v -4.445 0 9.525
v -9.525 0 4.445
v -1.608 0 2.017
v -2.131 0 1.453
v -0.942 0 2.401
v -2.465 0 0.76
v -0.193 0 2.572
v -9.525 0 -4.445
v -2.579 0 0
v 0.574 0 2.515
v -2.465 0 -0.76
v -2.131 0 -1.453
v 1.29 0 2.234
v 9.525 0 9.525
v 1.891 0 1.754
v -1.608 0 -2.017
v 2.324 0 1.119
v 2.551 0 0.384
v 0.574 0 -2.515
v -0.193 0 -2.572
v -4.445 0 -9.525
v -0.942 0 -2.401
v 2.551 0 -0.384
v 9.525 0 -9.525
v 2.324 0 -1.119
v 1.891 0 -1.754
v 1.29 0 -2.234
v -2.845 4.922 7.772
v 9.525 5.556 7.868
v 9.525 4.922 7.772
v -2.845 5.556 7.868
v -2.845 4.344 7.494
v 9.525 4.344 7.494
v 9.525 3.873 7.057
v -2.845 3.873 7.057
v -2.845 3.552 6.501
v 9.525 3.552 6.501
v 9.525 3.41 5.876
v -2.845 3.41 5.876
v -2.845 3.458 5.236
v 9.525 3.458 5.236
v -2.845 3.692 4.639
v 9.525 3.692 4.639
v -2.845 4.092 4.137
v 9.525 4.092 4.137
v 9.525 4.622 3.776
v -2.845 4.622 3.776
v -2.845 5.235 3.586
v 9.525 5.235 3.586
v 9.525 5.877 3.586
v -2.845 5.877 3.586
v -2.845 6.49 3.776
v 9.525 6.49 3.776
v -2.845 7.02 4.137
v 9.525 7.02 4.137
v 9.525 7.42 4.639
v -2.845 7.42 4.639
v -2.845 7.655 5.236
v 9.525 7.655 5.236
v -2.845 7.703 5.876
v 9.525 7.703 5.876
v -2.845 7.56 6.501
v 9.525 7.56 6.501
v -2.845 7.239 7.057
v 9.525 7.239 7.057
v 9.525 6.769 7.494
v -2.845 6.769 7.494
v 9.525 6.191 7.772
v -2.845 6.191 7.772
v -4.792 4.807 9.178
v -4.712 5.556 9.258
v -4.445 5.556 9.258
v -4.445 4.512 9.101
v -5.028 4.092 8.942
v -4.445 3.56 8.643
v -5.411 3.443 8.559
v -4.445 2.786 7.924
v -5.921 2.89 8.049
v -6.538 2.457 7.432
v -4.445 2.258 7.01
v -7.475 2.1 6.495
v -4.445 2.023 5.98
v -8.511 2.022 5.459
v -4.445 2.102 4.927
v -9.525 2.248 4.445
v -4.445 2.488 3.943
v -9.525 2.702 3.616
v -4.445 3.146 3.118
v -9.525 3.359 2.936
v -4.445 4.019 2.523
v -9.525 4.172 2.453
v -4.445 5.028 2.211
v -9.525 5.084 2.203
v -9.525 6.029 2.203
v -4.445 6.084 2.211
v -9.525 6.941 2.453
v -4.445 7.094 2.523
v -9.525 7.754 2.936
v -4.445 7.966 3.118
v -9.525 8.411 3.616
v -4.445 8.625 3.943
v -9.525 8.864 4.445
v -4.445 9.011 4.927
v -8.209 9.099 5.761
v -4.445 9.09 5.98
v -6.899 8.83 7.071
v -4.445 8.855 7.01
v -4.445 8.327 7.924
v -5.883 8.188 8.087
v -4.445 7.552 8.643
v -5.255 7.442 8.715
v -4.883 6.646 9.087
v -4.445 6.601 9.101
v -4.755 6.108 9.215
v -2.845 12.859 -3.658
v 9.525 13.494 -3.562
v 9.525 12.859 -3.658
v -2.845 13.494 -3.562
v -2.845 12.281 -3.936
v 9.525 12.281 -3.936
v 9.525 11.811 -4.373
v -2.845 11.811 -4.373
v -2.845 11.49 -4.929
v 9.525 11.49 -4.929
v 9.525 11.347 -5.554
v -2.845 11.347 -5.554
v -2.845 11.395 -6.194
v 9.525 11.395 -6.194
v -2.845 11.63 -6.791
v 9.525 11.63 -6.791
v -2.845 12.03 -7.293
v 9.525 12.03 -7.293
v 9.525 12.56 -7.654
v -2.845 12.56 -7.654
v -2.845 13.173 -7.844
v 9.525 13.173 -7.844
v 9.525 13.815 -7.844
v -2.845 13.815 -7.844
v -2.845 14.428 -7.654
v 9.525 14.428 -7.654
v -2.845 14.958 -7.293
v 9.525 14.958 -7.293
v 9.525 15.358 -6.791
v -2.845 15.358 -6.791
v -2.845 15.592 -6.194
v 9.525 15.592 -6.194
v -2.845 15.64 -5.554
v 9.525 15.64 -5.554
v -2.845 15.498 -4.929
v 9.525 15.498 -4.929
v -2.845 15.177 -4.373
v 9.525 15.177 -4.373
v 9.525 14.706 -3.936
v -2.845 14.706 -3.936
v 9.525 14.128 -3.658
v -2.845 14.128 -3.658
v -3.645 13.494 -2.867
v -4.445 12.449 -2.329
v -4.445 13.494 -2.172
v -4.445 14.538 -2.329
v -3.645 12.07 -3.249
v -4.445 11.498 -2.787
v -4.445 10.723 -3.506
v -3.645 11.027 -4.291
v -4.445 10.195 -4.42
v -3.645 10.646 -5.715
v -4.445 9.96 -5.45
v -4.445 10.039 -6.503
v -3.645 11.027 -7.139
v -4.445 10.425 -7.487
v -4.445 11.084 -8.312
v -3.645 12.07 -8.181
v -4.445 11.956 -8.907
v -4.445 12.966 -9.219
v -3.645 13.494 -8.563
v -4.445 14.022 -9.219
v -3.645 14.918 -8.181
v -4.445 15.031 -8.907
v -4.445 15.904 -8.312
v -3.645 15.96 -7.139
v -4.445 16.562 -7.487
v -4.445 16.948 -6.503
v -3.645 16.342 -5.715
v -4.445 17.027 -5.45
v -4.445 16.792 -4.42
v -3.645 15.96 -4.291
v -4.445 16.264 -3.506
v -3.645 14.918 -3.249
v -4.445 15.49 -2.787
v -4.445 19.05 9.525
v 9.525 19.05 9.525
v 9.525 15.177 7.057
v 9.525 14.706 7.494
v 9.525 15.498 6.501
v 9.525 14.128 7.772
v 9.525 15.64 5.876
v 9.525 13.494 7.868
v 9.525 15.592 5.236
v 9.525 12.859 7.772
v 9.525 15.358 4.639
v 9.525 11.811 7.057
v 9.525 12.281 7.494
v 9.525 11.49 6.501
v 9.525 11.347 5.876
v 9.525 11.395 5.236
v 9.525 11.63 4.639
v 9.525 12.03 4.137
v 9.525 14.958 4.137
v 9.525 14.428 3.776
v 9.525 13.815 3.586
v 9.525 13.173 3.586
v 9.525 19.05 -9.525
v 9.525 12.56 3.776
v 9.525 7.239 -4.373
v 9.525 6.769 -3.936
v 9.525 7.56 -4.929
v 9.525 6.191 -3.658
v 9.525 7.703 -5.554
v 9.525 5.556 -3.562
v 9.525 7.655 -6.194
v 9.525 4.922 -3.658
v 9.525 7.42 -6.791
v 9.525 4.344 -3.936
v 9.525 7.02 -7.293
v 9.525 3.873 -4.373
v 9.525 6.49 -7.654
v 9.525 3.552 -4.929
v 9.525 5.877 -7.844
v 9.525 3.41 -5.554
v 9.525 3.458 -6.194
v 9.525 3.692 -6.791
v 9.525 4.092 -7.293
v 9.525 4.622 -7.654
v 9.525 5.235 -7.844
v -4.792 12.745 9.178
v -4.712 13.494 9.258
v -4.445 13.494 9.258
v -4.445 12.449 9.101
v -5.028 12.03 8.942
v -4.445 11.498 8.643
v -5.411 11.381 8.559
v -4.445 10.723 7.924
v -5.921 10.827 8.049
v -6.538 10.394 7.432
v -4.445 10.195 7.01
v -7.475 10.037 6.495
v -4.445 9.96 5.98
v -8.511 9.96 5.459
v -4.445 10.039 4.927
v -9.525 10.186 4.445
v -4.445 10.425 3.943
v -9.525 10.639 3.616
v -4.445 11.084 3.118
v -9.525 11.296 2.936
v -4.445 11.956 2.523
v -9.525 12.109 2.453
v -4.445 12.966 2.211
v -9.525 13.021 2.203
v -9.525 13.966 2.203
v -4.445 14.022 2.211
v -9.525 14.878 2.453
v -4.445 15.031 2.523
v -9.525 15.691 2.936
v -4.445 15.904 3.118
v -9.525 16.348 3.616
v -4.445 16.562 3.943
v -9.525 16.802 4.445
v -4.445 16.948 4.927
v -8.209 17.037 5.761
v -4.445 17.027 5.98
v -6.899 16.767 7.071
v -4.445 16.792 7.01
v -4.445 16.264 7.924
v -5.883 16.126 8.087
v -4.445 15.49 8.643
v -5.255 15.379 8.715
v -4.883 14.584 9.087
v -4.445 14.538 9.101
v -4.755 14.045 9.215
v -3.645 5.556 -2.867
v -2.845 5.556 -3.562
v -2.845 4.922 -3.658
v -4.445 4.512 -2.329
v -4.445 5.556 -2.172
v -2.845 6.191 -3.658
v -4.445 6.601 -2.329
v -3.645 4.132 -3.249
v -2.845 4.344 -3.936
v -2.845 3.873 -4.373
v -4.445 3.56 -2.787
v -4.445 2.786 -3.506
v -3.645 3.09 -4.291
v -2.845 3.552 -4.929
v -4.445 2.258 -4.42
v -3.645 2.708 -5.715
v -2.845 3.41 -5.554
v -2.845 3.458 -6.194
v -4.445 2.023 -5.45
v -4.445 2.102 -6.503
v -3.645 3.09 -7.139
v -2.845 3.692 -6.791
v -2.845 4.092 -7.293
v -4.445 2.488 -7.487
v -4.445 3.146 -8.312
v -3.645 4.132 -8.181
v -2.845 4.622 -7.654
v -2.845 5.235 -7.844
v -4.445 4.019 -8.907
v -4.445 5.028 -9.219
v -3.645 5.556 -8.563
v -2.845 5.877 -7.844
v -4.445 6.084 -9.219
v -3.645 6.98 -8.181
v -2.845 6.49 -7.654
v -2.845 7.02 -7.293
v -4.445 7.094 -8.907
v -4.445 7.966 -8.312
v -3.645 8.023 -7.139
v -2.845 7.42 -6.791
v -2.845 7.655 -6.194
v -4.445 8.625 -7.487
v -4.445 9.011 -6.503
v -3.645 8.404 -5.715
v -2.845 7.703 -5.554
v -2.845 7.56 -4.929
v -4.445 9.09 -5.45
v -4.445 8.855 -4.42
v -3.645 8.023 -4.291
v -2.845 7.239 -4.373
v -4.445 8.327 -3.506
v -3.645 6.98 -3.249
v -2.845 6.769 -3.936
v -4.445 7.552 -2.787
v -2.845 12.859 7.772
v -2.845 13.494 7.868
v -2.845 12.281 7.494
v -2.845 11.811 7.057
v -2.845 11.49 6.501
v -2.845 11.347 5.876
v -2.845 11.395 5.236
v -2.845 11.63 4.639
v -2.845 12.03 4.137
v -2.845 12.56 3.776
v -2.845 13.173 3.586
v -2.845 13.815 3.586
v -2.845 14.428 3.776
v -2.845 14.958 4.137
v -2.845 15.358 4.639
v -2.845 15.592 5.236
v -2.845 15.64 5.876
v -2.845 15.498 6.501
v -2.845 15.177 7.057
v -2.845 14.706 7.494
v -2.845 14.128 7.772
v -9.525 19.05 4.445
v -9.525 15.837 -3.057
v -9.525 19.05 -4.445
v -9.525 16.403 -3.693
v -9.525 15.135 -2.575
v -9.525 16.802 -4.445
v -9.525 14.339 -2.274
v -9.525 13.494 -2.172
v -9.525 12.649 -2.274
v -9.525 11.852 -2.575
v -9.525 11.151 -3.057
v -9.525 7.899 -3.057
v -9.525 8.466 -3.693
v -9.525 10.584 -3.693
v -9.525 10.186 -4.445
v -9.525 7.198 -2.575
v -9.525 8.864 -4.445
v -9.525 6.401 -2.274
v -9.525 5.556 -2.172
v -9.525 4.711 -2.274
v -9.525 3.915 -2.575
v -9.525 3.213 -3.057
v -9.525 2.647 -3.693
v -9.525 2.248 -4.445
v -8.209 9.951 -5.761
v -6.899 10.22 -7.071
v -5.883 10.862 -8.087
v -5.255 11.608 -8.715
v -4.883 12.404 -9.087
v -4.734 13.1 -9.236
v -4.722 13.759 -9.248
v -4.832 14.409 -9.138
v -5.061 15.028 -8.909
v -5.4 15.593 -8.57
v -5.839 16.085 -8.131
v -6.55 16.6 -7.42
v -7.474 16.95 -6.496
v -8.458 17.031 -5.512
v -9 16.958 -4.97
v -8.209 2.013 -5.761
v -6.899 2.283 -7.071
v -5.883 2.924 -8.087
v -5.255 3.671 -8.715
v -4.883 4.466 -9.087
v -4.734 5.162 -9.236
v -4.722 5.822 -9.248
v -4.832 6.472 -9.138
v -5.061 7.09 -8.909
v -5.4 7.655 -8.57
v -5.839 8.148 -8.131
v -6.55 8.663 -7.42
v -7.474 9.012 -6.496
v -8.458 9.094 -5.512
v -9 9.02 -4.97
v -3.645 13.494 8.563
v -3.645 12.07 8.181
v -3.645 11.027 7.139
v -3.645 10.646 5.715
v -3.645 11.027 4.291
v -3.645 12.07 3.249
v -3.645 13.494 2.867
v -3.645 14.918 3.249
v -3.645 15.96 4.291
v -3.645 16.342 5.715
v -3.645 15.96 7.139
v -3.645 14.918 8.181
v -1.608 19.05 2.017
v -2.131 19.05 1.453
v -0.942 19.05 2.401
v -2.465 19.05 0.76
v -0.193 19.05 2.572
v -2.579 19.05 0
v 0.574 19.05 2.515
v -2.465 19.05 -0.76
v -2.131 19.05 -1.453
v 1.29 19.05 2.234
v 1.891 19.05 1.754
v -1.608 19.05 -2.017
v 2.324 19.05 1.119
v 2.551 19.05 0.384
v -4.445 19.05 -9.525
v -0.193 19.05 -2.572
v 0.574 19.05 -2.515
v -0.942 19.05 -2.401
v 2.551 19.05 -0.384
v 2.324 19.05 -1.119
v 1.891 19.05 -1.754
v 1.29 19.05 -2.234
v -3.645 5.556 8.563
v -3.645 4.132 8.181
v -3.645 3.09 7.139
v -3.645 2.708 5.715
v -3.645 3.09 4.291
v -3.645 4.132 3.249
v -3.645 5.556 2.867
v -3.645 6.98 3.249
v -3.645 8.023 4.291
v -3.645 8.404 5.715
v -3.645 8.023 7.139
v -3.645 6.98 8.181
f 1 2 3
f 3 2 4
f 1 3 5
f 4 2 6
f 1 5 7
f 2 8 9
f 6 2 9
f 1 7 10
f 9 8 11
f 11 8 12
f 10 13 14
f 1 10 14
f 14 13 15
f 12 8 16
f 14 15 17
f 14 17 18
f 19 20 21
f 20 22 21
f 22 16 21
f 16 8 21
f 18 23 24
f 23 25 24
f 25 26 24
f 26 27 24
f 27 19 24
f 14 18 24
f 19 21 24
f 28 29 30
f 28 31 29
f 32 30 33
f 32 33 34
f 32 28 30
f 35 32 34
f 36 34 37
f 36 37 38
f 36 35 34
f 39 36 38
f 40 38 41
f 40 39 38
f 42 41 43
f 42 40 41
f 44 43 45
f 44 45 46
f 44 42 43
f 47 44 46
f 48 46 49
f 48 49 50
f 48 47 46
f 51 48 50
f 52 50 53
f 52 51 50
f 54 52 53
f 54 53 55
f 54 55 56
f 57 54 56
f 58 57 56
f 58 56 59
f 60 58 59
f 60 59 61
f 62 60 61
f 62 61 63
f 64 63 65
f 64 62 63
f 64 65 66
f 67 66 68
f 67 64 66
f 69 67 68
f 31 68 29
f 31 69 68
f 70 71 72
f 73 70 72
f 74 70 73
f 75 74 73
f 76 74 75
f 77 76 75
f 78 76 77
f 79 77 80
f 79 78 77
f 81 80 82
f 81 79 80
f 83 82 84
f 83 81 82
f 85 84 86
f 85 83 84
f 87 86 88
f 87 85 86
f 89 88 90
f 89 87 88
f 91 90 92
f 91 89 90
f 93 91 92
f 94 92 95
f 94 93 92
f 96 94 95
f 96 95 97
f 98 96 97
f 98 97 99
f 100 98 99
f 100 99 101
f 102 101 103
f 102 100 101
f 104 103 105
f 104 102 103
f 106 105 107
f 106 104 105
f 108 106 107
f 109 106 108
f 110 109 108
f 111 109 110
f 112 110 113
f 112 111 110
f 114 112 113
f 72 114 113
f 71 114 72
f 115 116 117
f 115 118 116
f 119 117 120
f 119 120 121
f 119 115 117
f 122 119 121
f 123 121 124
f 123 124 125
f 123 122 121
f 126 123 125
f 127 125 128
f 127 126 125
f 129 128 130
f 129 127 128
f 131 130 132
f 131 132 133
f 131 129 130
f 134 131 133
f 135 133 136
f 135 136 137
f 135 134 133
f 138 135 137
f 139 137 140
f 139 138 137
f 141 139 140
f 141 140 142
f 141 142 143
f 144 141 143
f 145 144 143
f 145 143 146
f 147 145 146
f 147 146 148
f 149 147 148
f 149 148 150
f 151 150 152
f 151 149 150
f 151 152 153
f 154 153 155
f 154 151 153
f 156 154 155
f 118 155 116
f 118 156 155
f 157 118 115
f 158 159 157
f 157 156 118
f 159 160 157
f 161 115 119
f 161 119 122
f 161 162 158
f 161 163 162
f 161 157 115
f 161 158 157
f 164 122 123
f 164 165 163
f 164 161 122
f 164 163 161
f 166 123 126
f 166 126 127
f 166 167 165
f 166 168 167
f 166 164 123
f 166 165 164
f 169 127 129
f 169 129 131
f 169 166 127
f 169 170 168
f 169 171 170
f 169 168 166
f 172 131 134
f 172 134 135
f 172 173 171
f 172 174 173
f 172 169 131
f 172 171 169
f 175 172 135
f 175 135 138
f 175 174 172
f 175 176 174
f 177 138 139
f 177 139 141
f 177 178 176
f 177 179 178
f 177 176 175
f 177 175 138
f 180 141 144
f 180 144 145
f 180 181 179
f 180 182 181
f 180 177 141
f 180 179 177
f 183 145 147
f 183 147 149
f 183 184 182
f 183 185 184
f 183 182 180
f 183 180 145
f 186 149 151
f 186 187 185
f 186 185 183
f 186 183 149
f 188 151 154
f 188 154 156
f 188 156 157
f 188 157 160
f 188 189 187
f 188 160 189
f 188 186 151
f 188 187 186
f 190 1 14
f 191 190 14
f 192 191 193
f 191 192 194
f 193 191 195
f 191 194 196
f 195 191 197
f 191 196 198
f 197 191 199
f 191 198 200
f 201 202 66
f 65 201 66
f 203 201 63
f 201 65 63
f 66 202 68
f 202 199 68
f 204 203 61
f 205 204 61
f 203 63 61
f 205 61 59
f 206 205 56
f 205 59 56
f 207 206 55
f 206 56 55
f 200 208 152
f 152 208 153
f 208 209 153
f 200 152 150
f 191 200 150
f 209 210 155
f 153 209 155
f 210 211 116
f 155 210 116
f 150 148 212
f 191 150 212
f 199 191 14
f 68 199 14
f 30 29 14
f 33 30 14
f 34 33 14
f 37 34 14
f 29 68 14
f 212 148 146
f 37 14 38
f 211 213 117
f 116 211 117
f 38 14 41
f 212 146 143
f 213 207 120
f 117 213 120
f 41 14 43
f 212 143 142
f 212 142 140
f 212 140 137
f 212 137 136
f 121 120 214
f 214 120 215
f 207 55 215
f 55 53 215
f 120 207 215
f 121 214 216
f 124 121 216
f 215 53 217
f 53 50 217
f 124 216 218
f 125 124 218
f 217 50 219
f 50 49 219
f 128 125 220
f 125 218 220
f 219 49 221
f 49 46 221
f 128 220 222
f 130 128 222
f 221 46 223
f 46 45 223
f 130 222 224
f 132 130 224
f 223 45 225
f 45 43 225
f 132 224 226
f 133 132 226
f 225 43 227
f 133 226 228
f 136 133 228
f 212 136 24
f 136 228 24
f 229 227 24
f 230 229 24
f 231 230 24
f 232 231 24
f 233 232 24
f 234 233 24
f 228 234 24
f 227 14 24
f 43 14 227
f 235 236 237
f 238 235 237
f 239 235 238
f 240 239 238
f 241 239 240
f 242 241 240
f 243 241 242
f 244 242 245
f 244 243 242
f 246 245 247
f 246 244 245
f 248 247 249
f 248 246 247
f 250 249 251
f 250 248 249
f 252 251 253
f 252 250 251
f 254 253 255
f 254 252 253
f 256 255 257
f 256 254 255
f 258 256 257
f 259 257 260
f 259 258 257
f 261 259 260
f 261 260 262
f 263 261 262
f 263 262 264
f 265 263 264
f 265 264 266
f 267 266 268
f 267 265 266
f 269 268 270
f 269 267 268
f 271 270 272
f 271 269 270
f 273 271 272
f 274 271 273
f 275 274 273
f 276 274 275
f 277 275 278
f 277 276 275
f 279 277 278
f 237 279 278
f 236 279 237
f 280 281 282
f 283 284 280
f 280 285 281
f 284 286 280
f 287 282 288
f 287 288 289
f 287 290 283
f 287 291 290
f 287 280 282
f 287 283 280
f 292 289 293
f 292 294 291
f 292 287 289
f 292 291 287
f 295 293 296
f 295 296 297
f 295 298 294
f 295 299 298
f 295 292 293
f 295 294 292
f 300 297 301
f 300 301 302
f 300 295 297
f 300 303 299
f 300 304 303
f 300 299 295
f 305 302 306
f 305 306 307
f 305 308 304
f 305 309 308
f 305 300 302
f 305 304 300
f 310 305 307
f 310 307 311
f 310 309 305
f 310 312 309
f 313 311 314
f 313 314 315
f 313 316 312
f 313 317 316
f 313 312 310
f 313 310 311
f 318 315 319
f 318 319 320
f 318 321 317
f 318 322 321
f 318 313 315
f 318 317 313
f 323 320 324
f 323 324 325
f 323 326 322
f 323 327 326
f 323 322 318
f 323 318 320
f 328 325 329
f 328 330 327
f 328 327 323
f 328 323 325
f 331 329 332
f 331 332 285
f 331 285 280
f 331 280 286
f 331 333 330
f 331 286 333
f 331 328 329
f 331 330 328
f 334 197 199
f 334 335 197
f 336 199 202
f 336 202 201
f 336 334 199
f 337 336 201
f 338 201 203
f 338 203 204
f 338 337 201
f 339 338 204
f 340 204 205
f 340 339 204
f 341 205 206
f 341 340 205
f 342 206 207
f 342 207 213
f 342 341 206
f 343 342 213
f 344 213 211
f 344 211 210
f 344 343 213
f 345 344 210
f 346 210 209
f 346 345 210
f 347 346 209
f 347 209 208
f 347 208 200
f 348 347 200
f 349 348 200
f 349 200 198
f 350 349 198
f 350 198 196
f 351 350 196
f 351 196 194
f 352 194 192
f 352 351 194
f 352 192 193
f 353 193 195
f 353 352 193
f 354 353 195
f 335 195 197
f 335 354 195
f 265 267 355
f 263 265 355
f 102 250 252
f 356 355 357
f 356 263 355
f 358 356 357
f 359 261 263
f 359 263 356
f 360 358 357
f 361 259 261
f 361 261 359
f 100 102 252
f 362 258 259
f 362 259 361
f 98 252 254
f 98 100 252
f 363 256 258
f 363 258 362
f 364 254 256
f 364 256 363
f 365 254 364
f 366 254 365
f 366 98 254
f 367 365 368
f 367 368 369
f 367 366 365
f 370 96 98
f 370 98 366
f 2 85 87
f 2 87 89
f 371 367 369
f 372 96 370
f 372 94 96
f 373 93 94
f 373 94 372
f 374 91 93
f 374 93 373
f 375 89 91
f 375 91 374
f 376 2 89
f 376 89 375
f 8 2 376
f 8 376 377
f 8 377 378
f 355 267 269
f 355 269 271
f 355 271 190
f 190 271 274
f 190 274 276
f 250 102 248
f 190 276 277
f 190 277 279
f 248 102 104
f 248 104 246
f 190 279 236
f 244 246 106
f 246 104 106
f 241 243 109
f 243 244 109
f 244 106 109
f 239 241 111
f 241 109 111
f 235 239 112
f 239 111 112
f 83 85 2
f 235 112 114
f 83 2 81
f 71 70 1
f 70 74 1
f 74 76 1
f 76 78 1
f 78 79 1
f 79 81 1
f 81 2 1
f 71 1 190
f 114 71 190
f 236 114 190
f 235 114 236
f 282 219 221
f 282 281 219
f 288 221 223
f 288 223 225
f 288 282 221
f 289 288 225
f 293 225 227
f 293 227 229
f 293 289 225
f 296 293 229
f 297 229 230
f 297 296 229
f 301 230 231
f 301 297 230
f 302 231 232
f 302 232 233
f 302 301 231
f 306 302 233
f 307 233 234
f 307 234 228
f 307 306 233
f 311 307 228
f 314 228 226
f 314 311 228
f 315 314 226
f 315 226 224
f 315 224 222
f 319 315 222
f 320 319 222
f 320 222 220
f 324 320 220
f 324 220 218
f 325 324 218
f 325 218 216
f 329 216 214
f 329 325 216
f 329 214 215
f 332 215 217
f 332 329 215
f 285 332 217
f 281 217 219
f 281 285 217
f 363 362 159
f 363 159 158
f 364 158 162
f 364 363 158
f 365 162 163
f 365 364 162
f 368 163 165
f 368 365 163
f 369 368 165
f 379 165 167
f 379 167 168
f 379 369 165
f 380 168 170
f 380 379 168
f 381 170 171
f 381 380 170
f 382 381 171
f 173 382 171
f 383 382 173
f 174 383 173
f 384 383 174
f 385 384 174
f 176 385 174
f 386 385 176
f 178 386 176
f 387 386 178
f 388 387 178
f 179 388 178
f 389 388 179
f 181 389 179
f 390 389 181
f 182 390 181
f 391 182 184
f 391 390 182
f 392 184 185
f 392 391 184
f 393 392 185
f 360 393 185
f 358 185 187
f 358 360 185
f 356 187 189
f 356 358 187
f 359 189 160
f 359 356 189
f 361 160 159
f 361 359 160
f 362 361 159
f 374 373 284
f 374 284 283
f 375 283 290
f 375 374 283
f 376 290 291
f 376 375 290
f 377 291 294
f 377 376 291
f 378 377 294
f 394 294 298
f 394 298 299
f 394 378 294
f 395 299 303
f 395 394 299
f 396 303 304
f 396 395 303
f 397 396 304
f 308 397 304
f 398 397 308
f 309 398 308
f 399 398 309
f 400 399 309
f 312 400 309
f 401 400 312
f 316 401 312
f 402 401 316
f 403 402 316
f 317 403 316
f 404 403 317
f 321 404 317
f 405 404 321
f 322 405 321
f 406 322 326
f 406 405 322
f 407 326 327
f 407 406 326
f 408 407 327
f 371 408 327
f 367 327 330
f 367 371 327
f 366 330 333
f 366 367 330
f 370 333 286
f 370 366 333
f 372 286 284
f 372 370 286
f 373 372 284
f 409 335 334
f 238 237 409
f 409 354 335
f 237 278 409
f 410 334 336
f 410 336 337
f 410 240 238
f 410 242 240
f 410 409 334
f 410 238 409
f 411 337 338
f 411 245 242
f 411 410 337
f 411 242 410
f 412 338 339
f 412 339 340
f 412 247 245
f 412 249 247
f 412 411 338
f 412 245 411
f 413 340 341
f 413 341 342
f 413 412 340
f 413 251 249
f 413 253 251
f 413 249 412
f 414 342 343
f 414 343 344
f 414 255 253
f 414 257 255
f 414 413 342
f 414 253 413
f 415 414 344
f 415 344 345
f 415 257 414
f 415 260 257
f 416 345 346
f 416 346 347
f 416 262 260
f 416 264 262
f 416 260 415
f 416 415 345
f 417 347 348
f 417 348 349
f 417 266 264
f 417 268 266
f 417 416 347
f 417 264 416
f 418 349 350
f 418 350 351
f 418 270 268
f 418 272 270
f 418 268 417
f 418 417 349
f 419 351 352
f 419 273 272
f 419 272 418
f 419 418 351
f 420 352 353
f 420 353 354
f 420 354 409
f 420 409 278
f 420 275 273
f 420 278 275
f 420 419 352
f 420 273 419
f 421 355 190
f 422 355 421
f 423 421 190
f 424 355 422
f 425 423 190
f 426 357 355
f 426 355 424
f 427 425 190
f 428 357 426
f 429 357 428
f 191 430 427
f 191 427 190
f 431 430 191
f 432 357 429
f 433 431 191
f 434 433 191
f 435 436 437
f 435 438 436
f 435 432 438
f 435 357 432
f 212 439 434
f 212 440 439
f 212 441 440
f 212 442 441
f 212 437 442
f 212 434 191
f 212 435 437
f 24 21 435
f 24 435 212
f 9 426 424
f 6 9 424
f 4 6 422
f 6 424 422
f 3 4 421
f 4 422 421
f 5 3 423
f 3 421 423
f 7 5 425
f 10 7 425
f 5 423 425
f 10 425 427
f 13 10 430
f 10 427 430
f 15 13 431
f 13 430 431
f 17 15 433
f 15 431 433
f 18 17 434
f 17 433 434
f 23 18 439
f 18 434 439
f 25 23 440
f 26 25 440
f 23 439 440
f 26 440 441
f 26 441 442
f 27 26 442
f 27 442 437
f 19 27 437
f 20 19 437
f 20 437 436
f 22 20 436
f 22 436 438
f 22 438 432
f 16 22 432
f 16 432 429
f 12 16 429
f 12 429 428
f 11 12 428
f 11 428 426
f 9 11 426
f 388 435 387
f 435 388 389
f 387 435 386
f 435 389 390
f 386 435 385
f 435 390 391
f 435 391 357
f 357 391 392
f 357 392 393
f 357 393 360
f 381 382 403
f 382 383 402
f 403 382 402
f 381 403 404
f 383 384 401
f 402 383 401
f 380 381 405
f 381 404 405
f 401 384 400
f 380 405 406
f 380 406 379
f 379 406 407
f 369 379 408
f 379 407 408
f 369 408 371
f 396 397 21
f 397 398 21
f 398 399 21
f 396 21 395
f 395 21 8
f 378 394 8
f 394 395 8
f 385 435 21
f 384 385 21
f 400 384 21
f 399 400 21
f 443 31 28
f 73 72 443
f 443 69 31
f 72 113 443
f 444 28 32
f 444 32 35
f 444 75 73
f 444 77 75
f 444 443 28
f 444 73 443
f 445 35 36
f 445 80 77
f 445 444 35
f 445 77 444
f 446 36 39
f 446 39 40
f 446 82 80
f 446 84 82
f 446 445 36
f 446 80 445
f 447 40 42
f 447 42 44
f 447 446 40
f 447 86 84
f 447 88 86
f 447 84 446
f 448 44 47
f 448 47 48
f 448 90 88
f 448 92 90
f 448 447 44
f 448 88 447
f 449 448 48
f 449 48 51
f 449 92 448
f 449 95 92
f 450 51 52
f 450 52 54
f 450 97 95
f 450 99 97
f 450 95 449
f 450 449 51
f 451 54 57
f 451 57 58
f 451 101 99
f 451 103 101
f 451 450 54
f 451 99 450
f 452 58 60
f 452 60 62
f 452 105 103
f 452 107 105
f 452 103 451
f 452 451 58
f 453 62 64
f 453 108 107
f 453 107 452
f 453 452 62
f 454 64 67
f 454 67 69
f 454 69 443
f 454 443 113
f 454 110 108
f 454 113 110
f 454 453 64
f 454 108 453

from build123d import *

# Parameters (mm, degrees)
SKETCH1_W                                     = 19.05
SKETCH1_H                                     = 19.05
BOSS_EXTRUDE1_DEPTH                           = 19.05
TAPPED_HOLE_FOR_10_24_HELICOIL1_D             = 5.15874
CSK_FOR_6_FLAT_HEAD_MACHINE_SCREW1_AT_2_COUNT = 2
CSK_FOR_6_FLAT_HEAD_MACHINE_SCREW1_AT_2_PITCH = 7.9375
CSK_FOR_6_FLAT_HEAD_MACHINE_SCREW1_AT_3_COUNT = 2
CSK_FOR_6_FLAT_HEAD_MACHINE_SCREW1_AT_3_PITCH = 13.915775446
CSK_FOR_6_FLAT_HEAD_MACHINE_SCREW1_AT_4_COUNT = 2
CSK_FOR_6_FLAT_HEAD_MACHINE_SCREW1_AT_4_PITCH = 11.43
CHAMFER2_SIZE                                 = 5.08


with BuildPart() as part:
    # Sketch1 → Boss-Extrude1 (new body)
    with BuildSketch(Plane(origin=(0, 0, 0), x_dir=(1, 0, 0), z_dir=(0, 1, 0))):
        Rectangle(SKETCH1_W, SKETCH1_H)
    extrude(amount=BOSS_EXTRUDE1_DEPTH)

    # Tapped Hole for #10-24 Helicoil1 (through all)
    with Locations(Plane.XZ):
        with Locations((0, 0)):
            Hole(TAPPED_HOLE_FOR_10_24_HELICOIL1_D / 2)

    # Sketch5 → CSK for #6 Flat Head Machine Screw1 (revolve, cut)
    with BuildSketch(Plane(origin=(-9.525, 5.55625, 5.715), x_dir=(0, 0, 1), z_dir=(0, 1, 0))):
        Polygon((0, 0), (0, 19.05), (2.15265, 19.05), (2.15265, 6.679759826), (3.5433, 5.08), (3.5433, 0), align=None)
    csk_for_6_flat_head_machine_screw1 = revolve(axis=Axis((-15.875, 5.55625, 5.715), (1, 0, 0)), mode=Mode.SUBTRACT)

    # CSK for #6 Flat Head Machine Screw1 at 2: CSK for #6 Flat Head Machine Screw1 ×2
    with Locations(*[(0, i * CSK_FOR_6_FLAT_HEAD_MACHINE_SCREW1_AT_2_PITCH, 0) for i in range(1, CSK_FOR_6_FLAT_HEAD_MACHINE_SCREW1_AT_2_COUNT)]):
        add(csk_for_6_flat_head_machine_screw1, mode=Mode.SUBTRACT)

    # CSK for #6 Flat Head Machine Screw1 at 3: CSK for #6 Flat Head Machine Screw1 ×2
    with Locations(*[Vector(0, 0.5703958094953442, -0.8213699656732957) * (i * CSK_FOR_6_FLAT_HEAD_MACHINE_SCREW1_AT_3_PITCH) for i in range(1, CSK_FOR_6_FLAT_HEAD_MACHINE_SCREW1_AT_3_COUNT)]):
        add(csk_for_6_flat_head_machine_screw1, mode=Mode.SUBTRACT)

    # CSK for #6 Flat Head Machine Screw1 at 4: CSK for #6 Flat Head Machine Screw1 ×2
    with Locations(*[(0, 0, -i * CSK_FOR_6_FLAT_HEAD_MACHINE_SCREW1_AT_4_PITCH) for i in range(1, CSK_FOR_6_FLAT_HEAD_MACHINE_SCREW1_AT_4_COUNT)]):
        add(csk_for_6_flat_head_machine_screw1, mode=Mode.SUBTRACT)

    # Chamfer2
    # the kernel refuses this chamfer: 5.08 mm, written as the material it takes off along each edge
    with BuildSketch(Plane(origin=(-9.525, -13.064149579, -9.525), x_dir=(0.9996219169112966, 0, -0.02749587661058626), z_dir=(0, 1, 0)), Plane(origin=(-9.525, -13.064149579, 9.525), x_dir=(-0.02749587661058626, 0, -0.9996219169112968), z_dir=(0, 1, 0))) as chamfer2_piece_1:
        Polygon((CHAMFER2_SIZE * 0.999621916911, -CHAMFER2_SIZE * 0.0274958766106), (-CHAMFER2_SIZE * 0.0274958766106, -CHAMFER2_SIZE * 0.999621916911), (0, 0), align=None)
    extrude(amount=45.178299158, mode=Mode.SUBTRACT)


solid = part.part
